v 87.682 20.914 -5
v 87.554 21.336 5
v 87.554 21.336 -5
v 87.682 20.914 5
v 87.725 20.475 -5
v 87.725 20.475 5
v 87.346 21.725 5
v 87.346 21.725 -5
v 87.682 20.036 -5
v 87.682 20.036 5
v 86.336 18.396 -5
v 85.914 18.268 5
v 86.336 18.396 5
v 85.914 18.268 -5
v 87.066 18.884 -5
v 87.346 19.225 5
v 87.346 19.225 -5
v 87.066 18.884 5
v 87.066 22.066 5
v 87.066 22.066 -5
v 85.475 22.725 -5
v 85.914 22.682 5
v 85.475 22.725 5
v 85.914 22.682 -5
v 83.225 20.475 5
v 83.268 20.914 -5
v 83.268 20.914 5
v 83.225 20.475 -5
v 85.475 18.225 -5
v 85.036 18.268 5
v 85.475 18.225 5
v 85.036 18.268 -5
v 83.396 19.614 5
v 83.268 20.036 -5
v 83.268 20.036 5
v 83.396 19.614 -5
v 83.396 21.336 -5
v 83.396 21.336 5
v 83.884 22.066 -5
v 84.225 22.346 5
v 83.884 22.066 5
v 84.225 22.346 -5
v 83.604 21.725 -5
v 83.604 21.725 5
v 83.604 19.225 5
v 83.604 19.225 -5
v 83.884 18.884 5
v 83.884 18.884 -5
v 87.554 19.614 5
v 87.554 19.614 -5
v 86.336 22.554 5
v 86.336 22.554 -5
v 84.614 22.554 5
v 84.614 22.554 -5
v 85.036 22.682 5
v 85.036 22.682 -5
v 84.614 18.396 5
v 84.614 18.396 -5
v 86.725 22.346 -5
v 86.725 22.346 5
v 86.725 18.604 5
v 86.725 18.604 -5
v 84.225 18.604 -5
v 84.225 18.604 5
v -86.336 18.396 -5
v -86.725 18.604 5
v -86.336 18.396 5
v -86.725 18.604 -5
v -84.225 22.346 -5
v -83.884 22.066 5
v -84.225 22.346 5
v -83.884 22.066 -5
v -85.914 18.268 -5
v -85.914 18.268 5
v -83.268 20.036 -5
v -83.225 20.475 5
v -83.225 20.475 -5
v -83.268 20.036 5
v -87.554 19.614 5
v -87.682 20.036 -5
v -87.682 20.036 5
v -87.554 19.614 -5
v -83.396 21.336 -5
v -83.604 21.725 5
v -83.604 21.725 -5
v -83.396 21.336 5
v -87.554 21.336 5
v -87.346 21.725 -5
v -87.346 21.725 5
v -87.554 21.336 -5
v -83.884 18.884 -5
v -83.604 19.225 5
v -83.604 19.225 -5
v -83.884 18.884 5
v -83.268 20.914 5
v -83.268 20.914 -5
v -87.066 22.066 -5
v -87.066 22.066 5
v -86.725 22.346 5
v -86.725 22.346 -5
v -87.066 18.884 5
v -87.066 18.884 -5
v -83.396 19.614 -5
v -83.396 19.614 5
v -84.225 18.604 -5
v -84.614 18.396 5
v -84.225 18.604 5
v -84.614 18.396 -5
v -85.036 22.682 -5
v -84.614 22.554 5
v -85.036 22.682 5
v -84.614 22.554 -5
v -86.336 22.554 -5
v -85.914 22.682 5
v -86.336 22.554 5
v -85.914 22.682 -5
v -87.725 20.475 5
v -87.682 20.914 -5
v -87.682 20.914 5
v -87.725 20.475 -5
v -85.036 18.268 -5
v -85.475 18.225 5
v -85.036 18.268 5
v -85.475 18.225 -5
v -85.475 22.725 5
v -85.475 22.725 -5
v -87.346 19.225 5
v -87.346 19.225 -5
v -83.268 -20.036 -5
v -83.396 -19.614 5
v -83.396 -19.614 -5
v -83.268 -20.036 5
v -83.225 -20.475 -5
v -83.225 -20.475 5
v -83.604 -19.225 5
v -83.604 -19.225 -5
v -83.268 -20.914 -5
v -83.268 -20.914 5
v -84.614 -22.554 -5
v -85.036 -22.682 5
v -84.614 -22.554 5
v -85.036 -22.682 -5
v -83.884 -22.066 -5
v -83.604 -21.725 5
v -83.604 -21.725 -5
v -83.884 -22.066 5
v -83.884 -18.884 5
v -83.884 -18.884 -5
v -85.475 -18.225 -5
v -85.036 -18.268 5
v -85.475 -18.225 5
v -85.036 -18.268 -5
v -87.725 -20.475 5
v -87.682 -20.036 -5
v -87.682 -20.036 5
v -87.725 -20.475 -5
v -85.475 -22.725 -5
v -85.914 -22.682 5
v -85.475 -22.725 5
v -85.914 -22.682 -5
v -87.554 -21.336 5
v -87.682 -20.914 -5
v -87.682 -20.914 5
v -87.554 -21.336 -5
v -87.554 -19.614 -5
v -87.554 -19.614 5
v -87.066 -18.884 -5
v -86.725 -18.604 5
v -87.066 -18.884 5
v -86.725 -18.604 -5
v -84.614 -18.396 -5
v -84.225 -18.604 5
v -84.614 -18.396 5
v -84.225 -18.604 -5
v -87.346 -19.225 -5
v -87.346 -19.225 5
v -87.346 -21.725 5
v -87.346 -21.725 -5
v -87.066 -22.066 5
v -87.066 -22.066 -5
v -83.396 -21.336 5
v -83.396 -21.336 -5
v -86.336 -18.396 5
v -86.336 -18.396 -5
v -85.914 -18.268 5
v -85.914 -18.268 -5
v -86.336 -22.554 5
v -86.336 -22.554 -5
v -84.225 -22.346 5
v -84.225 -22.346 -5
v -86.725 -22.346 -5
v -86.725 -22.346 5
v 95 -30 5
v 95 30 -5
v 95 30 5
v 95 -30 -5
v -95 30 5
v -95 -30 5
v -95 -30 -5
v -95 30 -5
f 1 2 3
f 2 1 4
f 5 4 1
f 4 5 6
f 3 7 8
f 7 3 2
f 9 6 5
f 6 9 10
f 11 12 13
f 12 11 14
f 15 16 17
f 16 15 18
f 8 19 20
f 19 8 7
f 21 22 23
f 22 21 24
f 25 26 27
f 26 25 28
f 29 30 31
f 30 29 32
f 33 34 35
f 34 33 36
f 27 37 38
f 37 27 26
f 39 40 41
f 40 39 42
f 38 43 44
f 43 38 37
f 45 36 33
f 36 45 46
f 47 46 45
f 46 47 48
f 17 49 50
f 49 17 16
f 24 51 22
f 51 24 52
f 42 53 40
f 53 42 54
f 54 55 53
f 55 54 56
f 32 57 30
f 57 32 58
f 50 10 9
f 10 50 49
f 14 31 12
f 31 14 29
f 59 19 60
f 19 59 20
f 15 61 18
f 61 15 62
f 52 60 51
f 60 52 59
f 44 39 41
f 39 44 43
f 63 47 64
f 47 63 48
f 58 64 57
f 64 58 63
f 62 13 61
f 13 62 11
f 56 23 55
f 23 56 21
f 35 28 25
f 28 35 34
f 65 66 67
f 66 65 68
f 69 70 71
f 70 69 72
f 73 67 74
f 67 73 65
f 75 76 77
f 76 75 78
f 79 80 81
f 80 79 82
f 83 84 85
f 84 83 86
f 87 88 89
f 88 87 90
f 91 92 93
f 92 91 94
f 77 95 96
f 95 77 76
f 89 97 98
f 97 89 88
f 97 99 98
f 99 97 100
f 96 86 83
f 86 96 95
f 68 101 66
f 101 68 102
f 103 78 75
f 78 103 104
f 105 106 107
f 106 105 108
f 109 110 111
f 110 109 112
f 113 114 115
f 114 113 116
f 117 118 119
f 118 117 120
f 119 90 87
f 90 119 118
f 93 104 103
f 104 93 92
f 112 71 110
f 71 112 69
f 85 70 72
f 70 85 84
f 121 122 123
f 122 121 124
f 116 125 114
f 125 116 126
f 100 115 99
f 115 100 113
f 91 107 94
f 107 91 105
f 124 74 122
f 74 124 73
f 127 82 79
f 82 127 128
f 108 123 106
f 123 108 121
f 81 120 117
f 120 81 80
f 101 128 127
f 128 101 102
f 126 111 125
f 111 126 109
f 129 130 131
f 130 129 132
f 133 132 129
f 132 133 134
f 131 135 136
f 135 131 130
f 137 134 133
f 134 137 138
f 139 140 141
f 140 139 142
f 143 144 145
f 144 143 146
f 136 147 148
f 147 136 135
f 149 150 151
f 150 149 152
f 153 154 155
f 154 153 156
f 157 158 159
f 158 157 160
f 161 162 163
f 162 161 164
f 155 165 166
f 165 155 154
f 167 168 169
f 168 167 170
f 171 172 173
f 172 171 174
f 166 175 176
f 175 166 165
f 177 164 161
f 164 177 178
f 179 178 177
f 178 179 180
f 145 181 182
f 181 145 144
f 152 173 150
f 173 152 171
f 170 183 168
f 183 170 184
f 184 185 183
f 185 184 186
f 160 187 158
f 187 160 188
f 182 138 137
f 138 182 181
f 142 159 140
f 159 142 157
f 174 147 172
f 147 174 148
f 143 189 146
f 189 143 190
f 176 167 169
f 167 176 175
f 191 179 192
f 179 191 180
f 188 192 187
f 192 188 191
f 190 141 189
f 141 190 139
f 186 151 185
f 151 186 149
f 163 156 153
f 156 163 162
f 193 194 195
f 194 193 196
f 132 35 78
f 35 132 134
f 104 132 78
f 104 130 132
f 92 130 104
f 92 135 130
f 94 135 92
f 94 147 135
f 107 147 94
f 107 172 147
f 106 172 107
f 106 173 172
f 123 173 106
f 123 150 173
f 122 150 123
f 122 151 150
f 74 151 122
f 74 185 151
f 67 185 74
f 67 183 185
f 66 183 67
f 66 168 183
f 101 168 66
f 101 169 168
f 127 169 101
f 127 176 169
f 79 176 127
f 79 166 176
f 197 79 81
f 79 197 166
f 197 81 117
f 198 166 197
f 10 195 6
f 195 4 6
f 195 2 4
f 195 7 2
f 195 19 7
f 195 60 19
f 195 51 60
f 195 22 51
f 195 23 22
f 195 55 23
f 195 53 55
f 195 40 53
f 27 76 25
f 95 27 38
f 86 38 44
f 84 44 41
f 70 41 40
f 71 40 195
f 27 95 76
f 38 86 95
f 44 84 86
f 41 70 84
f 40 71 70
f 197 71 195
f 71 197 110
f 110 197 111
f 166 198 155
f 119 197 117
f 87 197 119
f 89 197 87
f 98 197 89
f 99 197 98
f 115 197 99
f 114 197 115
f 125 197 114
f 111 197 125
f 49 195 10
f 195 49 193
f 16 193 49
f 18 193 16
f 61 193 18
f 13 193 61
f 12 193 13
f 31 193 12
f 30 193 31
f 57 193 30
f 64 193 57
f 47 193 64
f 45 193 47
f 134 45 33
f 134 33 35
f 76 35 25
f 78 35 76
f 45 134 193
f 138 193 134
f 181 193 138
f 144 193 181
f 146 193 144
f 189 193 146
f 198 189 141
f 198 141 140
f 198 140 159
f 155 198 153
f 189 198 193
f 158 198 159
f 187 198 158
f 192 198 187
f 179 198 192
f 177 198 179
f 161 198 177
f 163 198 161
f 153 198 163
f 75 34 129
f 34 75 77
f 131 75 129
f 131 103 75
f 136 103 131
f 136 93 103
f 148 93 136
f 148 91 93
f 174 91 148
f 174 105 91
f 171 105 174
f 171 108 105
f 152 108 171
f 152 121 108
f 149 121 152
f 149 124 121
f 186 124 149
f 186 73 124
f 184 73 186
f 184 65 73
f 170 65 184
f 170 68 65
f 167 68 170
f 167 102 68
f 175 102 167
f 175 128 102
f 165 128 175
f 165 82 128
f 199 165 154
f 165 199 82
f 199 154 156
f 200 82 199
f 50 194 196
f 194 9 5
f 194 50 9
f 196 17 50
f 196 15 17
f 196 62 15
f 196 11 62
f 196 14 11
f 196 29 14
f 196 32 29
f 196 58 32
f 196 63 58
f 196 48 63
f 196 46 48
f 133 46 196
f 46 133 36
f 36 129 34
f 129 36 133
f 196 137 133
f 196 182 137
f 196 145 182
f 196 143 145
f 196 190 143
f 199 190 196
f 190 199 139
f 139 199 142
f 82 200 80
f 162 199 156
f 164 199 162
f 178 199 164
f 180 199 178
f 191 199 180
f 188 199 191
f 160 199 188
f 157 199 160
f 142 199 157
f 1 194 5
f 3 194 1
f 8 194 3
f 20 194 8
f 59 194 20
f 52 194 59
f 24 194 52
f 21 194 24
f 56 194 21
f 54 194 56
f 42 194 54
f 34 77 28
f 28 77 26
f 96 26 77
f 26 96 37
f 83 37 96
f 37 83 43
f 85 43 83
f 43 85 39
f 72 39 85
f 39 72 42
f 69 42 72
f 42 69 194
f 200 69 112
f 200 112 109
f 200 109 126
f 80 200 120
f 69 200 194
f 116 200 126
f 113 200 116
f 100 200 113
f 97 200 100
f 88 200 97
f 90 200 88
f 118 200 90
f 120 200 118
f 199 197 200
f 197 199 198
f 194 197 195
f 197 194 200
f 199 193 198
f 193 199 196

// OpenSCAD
$fn = 32;

// ----------------------------------------------------------------------
// Corner plate 190 x 60 x 10
// 3 holes, centres taken from the edge offset
// ----------------------------------------------------------------------

// --- parameters (mm) ---
plate = [190, 60, 10];  // overall size (x, y, z)
holes = 3;              // number of holes the drawing asks for
hole_d = 4.5;           // hole diameter
edge = 9.525;           // hole centre offset from the plate edge

// --- derived feature positions (mm) ---
corner_x = plate[0] / 2 - edge;  // = 85.47   corner hole X
corner_y = plate[1] / 2 - edge;  // = 20.48   corner hole Y
feature_centers = [
  [corner_x, corner_y],
  [-corner_x, corner_y],
  [-corner_x, -corner_y]
];   // hole centres the loop below drills

// plate outline, every hole drilled through with the same cutters
difference() {
  cube(plate, center = true);
  for (centre = feature_centers)
    translate([centre[0], centre[1], 0])
      cylinder(d = hole_d, h = plate[2] + 2, center = true);
}
